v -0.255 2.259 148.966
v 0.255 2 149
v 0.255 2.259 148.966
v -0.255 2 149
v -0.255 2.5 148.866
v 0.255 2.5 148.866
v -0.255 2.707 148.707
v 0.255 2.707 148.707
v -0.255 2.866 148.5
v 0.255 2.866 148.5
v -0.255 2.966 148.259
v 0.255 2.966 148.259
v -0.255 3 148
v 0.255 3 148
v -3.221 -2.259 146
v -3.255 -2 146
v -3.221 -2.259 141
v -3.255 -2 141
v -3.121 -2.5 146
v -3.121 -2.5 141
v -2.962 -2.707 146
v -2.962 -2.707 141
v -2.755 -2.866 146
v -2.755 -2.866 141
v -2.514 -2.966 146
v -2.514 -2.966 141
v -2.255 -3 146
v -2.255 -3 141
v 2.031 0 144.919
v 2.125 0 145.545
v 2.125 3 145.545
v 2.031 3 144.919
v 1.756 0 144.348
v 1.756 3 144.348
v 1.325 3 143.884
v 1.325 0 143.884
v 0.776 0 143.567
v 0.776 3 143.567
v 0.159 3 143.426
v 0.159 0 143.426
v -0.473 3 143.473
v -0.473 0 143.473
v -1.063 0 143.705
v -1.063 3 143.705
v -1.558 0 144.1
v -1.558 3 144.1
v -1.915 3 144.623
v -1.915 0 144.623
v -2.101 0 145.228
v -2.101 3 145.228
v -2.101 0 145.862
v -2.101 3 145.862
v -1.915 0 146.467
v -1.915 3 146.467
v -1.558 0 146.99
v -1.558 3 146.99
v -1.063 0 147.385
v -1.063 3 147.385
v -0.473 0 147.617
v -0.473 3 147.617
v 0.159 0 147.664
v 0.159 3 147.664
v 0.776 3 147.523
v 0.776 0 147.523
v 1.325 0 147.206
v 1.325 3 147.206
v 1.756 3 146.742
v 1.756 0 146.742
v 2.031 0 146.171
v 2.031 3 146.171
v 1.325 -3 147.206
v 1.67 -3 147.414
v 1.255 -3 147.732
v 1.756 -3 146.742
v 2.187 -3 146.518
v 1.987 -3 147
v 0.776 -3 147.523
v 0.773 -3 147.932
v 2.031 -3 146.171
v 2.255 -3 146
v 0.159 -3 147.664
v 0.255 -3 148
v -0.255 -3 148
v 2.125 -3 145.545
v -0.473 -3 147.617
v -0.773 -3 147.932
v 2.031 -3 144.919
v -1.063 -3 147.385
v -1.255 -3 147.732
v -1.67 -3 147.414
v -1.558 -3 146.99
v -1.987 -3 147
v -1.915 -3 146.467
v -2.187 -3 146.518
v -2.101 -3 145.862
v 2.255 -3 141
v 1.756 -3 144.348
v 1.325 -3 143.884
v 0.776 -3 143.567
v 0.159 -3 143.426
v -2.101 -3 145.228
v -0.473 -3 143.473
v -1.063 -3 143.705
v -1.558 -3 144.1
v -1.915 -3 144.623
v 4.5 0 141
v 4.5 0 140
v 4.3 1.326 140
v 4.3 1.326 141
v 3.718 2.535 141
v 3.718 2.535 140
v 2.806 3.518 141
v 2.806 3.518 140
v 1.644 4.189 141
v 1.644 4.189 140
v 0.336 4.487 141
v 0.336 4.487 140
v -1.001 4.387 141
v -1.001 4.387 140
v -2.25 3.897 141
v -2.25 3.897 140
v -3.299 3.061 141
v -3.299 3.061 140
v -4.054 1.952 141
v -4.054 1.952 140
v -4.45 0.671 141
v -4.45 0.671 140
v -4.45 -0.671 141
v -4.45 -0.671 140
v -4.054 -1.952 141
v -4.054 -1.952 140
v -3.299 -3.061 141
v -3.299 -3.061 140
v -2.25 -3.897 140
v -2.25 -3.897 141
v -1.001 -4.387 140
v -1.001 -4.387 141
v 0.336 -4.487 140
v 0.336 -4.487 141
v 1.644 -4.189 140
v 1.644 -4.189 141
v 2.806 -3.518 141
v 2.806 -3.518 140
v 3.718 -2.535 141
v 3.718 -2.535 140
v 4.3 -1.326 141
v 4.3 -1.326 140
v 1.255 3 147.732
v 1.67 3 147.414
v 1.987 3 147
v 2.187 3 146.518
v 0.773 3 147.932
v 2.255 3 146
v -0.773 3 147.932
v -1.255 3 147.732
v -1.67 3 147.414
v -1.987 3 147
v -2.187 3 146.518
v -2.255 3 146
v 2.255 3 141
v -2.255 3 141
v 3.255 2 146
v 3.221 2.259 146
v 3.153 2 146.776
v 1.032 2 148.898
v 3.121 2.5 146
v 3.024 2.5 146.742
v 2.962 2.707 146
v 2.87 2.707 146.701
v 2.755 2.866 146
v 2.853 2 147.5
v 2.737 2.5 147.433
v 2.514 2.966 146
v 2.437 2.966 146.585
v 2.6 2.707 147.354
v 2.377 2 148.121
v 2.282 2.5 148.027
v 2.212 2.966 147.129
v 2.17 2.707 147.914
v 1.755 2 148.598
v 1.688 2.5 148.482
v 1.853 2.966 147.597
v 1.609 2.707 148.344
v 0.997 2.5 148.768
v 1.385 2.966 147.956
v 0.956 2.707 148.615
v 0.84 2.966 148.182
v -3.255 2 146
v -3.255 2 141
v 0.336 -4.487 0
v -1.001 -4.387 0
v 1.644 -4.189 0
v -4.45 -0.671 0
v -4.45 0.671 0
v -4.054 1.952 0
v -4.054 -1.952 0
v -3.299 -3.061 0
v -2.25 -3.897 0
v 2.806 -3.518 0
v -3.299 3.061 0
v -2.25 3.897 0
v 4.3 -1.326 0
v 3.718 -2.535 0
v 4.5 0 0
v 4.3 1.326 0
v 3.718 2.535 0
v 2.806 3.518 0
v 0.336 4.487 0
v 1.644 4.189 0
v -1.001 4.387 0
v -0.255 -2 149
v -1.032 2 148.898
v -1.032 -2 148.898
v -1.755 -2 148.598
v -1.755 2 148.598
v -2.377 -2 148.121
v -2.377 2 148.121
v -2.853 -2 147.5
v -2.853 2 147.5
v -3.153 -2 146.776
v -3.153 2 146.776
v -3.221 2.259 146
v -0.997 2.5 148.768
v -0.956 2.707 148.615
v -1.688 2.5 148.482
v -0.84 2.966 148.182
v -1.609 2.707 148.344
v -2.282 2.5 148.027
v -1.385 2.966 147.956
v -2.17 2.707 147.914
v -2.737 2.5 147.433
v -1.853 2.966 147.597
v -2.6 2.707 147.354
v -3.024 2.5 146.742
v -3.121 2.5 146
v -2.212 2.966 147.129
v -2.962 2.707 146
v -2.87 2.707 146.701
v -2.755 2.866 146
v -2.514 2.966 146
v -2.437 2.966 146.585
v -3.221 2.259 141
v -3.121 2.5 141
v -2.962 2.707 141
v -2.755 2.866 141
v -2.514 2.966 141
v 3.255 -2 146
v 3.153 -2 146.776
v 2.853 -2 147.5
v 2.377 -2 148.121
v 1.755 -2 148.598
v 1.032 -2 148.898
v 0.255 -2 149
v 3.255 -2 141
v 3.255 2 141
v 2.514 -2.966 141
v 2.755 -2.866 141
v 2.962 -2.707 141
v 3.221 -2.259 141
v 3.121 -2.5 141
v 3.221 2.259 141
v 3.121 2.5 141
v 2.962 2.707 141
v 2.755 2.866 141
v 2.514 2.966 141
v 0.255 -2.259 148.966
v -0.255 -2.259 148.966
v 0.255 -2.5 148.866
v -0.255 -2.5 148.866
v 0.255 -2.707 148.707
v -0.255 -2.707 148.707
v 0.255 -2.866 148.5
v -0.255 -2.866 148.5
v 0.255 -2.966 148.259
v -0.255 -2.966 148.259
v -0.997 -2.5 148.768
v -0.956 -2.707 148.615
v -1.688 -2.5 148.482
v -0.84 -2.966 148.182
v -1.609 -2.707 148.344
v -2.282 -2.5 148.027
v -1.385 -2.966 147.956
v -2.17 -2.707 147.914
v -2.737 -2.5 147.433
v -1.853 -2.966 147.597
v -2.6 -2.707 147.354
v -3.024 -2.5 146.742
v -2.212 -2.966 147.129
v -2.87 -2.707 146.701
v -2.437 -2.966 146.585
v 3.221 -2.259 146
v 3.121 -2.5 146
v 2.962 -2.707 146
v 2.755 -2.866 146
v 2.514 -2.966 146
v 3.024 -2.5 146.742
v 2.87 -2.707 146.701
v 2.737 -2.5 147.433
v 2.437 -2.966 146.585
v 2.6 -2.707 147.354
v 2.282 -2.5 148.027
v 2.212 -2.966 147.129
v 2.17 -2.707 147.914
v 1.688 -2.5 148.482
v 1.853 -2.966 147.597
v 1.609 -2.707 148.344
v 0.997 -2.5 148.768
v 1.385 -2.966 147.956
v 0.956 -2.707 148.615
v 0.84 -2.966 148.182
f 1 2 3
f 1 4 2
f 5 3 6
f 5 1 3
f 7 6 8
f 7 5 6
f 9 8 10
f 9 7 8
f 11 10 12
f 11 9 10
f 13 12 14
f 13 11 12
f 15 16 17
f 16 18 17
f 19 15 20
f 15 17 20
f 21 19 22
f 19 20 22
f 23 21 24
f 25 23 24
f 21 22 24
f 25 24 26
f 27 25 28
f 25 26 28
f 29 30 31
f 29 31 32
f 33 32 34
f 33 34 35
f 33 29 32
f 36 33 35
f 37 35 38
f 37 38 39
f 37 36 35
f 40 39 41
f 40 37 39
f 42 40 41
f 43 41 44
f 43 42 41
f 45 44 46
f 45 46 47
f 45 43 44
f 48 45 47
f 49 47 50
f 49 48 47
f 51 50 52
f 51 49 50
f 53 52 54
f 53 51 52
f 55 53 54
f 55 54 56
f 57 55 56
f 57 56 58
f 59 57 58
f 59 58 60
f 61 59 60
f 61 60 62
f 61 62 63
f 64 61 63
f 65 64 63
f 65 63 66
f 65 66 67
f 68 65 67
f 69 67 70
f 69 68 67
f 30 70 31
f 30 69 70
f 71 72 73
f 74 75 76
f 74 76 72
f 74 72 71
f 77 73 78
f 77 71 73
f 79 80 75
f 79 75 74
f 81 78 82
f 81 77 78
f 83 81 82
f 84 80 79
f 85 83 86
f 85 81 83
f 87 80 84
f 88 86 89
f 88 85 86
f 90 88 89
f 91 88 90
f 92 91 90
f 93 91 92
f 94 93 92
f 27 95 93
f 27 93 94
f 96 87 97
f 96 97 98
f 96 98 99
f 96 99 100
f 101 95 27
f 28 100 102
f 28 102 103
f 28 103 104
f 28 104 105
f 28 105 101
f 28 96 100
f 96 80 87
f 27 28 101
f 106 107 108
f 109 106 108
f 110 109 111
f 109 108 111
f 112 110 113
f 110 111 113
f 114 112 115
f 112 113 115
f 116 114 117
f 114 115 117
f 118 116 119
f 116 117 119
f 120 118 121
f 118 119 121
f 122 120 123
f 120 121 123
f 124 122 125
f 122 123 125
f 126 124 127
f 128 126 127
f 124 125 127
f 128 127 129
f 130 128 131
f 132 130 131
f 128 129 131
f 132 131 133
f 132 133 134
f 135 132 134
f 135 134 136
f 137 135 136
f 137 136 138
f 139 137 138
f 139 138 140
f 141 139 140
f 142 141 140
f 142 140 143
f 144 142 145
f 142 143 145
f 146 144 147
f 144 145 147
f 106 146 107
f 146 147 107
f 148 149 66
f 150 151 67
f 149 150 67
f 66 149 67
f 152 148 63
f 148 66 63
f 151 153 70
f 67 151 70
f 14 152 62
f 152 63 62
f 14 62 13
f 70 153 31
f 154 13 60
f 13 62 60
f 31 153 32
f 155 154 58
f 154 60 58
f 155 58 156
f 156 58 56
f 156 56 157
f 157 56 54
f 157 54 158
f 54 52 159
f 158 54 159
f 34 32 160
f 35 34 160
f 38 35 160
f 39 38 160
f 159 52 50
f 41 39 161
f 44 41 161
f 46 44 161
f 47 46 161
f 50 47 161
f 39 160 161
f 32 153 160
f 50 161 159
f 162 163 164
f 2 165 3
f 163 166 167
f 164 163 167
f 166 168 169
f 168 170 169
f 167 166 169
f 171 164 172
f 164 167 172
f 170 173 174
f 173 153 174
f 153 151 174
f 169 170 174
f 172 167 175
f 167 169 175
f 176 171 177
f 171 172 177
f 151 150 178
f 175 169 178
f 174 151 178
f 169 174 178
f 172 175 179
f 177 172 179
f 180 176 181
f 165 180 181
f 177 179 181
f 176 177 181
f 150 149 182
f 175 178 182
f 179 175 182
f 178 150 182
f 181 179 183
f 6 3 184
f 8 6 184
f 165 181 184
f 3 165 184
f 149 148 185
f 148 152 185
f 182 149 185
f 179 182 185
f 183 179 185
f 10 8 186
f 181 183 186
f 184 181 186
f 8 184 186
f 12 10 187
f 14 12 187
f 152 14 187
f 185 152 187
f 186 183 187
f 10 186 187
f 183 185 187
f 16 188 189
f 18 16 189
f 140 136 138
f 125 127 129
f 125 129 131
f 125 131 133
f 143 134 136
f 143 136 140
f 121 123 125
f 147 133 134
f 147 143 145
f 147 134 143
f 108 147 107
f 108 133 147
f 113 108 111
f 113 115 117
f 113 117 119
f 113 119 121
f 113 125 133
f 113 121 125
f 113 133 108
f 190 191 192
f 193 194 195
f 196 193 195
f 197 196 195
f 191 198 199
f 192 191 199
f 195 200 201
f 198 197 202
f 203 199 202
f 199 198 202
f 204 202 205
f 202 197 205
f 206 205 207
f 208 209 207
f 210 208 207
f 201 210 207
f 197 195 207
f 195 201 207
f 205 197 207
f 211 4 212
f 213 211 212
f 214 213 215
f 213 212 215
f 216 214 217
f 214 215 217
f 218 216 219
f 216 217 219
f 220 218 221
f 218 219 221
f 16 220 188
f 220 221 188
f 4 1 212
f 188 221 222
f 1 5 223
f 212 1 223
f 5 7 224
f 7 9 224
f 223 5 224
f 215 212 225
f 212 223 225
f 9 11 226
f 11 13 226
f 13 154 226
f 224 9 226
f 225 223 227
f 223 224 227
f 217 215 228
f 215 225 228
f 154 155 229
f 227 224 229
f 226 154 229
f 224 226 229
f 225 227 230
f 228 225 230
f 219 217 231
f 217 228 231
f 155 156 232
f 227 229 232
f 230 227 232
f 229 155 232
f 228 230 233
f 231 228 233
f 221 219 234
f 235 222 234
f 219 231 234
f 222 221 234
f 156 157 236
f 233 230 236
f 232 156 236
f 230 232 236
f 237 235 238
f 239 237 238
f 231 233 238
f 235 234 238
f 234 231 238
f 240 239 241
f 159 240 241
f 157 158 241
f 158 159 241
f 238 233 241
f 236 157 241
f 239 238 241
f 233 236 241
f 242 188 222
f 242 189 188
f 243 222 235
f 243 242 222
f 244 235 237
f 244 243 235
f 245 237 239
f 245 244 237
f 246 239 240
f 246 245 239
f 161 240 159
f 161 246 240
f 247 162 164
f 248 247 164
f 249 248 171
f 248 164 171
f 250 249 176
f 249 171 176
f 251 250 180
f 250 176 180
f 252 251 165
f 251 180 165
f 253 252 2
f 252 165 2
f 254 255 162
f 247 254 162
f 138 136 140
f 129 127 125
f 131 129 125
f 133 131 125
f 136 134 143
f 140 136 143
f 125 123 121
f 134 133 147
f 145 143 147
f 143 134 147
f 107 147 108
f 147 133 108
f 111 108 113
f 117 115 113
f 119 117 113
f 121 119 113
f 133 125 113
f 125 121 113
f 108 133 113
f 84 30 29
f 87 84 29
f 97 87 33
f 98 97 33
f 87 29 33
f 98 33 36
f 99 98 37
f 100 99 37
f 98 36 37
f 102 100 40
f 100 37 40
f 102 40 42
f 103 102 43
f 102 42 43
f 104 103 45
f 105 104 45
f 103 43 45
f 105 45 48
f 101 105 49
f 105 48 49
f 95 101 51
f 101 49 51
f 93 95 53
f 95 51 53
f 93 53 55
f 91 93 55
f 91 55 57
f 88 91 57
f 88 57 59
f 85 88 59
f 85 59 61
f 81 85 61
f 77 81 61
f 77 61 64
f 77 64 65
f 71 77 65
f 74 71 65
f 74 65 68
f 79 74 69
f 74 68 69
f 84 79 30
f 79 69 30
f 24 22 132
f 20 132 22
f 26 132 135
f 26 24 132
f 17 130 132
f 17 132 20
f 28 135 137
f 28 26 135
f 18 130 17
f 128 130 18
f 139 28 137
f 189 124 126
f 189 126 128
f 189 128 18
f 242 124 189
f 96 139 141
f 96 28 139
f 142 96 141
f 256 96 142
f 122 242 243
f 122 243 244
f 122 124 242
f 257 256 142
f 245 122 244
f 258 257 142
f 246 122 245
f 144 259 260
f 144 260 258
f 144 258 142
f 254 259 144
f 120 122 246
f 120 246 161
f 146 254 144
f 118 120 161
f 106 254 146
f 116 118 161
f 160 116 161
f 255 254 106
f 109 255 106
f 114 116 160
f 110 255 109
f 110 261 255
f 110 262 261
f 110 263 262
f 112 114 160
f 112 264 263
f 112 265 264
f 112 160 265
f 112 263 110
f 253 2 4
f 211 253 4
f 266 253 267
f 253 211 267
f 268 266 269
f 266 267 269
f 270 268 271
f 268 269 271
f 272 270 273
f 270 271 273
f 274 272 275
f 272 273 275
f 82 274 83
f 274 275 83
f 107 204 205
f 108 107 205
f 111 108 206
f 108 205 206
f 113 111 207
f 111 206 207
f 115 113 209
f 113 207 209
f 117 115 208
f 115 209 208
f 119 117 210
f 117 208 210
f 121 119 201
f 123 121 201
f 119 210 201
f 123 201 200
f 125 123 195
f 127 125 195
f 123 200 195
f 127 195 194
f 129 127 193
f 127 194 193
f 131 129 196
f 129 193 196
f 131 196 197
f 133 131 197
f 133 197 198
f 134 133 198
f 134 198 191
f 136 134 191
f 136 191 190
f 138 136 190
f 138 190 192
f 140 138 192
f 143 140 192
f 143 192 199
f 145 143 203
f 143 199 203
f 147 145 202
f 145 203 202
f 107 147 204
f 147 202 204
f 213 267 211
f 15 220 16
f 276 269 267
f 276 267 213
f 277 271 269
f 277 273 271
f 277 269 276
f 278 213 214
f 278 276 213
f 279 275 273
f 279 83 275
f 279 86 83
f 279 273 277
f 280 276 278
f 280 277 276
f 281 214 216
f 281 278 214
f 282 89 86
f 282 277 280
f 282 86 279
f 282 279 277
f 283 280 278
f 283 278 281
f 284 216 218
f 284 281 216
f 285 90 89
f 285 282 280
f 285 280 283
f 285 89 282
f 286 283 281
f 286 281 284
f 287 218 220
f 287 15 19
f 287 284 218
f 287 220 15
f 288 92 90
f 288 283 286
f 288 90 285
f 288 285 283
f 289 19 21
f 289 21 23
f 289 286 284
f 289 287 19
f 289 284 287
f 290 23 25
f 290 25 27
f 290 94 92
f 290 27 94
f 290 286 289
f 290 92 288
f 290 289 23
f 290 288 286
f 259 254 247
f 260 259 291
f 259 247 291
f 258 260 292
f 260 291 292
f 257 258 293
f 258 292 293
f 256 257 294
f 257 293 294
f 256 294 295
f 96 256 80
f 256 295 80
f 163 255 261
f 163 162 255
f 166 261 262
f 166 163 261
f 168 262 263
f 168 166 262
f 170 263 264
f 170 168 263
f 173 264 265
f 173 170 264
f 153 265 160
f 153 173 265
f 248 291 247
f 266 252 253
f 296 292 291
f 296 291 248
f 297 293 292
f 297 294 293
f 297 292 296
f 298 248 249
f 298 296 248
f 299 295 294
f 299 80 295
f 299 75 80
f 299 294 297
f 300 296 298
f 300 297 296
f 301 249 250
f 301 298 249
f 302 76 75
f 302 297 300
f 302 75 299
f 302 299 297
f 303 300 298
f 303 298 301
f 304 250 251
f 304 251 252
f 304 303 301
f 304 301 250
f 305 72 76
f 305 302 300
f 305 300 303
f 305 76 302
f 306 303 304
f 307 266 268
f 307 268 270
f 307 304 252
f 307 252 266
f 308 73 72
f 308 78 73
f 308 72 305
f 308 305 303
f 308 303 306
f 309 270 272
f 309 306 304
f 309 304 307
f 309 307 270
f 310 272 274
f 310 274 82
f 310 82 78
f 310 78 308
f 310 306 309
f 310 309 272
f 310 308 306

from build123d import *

# Parameters (mm, degrees)
SKETCH1_R                = 4.5
ROD_DEPTH                = 140
SKETCH2_R                = 4.5
BOSS_EXTRUDE2_DEPTH      = 1
BOSS_EXTRUDE4_DEPTH      = 3
BOSS_EXTRUDE4_DEPTH_BACK = 3
SKETCH4_R                = 2.125
FILLET2_R                = 1


with BuildPart() as part:
    # Sketch1 → Rod (new body)
    with BuildSketch(Plane.XY):
        Circle(SKETCH1_R)
    extrude(amount=ROD_DEPTH)


with BuildPart() as body_2:
    # Sketch2 → Boss-Extrude2 (new body)
    with BuildSketch(Plane.XY.offset(140)):
        Circle(SKETCH2_R)
    extrude(amount=BOSS_EXTRUDE2_DEPTH)

    # Sketch4 → Boss-Extrude4 (add, two sides: drawn at the far end of the back side and taken through both)
    with BuildSketch(Plane(origin=(0, 0, 0), x_dir=(1, 0, 0), z_dir=(0, 1, 0)).offset(-BOSS_EXTRUDE4_DEPTH_BACK)):
        with BuildLine():
            Line((-3.255351782, -141), (3.255351782, -141))
            Line((3.255351782, -141), (3.255351782, -146))
            ThreePointArc((3.255351782, -146), (2.376672125, -148.121320344), (0.255351782, -149))
            Line((0.255351782, -149), (-0.255351782, -149))
            ThreePointArc((-0.255351782, -149), (-2.376672125, -148.121320344), (-3.255351782, -146))
            Line((-3.255351782, -146), (-3.255351782, -141))
        make_face()
        with Locations((0, -145.54500745)):
            Circle(SKETCH4_R, mode=Mode.SUBTRACT)
    extrude(amount=BOSS_EXTRUDE4_DEPTH + BOSS_EXTRUDE4_DEPTH_BACK)

    # Fillet2
    fillet2_edges = [body_2.edges().sort_by_distance(p)[0] for p in [
        (-3.255351782, -3, 143.5),
        (-2.376672125, -3, 148.121320344),
        (0, -3, 149),
        (3.255351782, -3, 143.5),
        (-3.255351782, 3, 143.5),
        (-2.376672125, 3, 148.121320344),
        (0, 3, 149),
        (3.255351782, 3, 143.5),
        (2.376672125, -3, 148.121320344),
        (2.376672125, 3, 148.121320344),
    ]]
    fillet(fillet2_edges, radius=FILLET2_R)


solid = Compound([part.part, body_2.part])
